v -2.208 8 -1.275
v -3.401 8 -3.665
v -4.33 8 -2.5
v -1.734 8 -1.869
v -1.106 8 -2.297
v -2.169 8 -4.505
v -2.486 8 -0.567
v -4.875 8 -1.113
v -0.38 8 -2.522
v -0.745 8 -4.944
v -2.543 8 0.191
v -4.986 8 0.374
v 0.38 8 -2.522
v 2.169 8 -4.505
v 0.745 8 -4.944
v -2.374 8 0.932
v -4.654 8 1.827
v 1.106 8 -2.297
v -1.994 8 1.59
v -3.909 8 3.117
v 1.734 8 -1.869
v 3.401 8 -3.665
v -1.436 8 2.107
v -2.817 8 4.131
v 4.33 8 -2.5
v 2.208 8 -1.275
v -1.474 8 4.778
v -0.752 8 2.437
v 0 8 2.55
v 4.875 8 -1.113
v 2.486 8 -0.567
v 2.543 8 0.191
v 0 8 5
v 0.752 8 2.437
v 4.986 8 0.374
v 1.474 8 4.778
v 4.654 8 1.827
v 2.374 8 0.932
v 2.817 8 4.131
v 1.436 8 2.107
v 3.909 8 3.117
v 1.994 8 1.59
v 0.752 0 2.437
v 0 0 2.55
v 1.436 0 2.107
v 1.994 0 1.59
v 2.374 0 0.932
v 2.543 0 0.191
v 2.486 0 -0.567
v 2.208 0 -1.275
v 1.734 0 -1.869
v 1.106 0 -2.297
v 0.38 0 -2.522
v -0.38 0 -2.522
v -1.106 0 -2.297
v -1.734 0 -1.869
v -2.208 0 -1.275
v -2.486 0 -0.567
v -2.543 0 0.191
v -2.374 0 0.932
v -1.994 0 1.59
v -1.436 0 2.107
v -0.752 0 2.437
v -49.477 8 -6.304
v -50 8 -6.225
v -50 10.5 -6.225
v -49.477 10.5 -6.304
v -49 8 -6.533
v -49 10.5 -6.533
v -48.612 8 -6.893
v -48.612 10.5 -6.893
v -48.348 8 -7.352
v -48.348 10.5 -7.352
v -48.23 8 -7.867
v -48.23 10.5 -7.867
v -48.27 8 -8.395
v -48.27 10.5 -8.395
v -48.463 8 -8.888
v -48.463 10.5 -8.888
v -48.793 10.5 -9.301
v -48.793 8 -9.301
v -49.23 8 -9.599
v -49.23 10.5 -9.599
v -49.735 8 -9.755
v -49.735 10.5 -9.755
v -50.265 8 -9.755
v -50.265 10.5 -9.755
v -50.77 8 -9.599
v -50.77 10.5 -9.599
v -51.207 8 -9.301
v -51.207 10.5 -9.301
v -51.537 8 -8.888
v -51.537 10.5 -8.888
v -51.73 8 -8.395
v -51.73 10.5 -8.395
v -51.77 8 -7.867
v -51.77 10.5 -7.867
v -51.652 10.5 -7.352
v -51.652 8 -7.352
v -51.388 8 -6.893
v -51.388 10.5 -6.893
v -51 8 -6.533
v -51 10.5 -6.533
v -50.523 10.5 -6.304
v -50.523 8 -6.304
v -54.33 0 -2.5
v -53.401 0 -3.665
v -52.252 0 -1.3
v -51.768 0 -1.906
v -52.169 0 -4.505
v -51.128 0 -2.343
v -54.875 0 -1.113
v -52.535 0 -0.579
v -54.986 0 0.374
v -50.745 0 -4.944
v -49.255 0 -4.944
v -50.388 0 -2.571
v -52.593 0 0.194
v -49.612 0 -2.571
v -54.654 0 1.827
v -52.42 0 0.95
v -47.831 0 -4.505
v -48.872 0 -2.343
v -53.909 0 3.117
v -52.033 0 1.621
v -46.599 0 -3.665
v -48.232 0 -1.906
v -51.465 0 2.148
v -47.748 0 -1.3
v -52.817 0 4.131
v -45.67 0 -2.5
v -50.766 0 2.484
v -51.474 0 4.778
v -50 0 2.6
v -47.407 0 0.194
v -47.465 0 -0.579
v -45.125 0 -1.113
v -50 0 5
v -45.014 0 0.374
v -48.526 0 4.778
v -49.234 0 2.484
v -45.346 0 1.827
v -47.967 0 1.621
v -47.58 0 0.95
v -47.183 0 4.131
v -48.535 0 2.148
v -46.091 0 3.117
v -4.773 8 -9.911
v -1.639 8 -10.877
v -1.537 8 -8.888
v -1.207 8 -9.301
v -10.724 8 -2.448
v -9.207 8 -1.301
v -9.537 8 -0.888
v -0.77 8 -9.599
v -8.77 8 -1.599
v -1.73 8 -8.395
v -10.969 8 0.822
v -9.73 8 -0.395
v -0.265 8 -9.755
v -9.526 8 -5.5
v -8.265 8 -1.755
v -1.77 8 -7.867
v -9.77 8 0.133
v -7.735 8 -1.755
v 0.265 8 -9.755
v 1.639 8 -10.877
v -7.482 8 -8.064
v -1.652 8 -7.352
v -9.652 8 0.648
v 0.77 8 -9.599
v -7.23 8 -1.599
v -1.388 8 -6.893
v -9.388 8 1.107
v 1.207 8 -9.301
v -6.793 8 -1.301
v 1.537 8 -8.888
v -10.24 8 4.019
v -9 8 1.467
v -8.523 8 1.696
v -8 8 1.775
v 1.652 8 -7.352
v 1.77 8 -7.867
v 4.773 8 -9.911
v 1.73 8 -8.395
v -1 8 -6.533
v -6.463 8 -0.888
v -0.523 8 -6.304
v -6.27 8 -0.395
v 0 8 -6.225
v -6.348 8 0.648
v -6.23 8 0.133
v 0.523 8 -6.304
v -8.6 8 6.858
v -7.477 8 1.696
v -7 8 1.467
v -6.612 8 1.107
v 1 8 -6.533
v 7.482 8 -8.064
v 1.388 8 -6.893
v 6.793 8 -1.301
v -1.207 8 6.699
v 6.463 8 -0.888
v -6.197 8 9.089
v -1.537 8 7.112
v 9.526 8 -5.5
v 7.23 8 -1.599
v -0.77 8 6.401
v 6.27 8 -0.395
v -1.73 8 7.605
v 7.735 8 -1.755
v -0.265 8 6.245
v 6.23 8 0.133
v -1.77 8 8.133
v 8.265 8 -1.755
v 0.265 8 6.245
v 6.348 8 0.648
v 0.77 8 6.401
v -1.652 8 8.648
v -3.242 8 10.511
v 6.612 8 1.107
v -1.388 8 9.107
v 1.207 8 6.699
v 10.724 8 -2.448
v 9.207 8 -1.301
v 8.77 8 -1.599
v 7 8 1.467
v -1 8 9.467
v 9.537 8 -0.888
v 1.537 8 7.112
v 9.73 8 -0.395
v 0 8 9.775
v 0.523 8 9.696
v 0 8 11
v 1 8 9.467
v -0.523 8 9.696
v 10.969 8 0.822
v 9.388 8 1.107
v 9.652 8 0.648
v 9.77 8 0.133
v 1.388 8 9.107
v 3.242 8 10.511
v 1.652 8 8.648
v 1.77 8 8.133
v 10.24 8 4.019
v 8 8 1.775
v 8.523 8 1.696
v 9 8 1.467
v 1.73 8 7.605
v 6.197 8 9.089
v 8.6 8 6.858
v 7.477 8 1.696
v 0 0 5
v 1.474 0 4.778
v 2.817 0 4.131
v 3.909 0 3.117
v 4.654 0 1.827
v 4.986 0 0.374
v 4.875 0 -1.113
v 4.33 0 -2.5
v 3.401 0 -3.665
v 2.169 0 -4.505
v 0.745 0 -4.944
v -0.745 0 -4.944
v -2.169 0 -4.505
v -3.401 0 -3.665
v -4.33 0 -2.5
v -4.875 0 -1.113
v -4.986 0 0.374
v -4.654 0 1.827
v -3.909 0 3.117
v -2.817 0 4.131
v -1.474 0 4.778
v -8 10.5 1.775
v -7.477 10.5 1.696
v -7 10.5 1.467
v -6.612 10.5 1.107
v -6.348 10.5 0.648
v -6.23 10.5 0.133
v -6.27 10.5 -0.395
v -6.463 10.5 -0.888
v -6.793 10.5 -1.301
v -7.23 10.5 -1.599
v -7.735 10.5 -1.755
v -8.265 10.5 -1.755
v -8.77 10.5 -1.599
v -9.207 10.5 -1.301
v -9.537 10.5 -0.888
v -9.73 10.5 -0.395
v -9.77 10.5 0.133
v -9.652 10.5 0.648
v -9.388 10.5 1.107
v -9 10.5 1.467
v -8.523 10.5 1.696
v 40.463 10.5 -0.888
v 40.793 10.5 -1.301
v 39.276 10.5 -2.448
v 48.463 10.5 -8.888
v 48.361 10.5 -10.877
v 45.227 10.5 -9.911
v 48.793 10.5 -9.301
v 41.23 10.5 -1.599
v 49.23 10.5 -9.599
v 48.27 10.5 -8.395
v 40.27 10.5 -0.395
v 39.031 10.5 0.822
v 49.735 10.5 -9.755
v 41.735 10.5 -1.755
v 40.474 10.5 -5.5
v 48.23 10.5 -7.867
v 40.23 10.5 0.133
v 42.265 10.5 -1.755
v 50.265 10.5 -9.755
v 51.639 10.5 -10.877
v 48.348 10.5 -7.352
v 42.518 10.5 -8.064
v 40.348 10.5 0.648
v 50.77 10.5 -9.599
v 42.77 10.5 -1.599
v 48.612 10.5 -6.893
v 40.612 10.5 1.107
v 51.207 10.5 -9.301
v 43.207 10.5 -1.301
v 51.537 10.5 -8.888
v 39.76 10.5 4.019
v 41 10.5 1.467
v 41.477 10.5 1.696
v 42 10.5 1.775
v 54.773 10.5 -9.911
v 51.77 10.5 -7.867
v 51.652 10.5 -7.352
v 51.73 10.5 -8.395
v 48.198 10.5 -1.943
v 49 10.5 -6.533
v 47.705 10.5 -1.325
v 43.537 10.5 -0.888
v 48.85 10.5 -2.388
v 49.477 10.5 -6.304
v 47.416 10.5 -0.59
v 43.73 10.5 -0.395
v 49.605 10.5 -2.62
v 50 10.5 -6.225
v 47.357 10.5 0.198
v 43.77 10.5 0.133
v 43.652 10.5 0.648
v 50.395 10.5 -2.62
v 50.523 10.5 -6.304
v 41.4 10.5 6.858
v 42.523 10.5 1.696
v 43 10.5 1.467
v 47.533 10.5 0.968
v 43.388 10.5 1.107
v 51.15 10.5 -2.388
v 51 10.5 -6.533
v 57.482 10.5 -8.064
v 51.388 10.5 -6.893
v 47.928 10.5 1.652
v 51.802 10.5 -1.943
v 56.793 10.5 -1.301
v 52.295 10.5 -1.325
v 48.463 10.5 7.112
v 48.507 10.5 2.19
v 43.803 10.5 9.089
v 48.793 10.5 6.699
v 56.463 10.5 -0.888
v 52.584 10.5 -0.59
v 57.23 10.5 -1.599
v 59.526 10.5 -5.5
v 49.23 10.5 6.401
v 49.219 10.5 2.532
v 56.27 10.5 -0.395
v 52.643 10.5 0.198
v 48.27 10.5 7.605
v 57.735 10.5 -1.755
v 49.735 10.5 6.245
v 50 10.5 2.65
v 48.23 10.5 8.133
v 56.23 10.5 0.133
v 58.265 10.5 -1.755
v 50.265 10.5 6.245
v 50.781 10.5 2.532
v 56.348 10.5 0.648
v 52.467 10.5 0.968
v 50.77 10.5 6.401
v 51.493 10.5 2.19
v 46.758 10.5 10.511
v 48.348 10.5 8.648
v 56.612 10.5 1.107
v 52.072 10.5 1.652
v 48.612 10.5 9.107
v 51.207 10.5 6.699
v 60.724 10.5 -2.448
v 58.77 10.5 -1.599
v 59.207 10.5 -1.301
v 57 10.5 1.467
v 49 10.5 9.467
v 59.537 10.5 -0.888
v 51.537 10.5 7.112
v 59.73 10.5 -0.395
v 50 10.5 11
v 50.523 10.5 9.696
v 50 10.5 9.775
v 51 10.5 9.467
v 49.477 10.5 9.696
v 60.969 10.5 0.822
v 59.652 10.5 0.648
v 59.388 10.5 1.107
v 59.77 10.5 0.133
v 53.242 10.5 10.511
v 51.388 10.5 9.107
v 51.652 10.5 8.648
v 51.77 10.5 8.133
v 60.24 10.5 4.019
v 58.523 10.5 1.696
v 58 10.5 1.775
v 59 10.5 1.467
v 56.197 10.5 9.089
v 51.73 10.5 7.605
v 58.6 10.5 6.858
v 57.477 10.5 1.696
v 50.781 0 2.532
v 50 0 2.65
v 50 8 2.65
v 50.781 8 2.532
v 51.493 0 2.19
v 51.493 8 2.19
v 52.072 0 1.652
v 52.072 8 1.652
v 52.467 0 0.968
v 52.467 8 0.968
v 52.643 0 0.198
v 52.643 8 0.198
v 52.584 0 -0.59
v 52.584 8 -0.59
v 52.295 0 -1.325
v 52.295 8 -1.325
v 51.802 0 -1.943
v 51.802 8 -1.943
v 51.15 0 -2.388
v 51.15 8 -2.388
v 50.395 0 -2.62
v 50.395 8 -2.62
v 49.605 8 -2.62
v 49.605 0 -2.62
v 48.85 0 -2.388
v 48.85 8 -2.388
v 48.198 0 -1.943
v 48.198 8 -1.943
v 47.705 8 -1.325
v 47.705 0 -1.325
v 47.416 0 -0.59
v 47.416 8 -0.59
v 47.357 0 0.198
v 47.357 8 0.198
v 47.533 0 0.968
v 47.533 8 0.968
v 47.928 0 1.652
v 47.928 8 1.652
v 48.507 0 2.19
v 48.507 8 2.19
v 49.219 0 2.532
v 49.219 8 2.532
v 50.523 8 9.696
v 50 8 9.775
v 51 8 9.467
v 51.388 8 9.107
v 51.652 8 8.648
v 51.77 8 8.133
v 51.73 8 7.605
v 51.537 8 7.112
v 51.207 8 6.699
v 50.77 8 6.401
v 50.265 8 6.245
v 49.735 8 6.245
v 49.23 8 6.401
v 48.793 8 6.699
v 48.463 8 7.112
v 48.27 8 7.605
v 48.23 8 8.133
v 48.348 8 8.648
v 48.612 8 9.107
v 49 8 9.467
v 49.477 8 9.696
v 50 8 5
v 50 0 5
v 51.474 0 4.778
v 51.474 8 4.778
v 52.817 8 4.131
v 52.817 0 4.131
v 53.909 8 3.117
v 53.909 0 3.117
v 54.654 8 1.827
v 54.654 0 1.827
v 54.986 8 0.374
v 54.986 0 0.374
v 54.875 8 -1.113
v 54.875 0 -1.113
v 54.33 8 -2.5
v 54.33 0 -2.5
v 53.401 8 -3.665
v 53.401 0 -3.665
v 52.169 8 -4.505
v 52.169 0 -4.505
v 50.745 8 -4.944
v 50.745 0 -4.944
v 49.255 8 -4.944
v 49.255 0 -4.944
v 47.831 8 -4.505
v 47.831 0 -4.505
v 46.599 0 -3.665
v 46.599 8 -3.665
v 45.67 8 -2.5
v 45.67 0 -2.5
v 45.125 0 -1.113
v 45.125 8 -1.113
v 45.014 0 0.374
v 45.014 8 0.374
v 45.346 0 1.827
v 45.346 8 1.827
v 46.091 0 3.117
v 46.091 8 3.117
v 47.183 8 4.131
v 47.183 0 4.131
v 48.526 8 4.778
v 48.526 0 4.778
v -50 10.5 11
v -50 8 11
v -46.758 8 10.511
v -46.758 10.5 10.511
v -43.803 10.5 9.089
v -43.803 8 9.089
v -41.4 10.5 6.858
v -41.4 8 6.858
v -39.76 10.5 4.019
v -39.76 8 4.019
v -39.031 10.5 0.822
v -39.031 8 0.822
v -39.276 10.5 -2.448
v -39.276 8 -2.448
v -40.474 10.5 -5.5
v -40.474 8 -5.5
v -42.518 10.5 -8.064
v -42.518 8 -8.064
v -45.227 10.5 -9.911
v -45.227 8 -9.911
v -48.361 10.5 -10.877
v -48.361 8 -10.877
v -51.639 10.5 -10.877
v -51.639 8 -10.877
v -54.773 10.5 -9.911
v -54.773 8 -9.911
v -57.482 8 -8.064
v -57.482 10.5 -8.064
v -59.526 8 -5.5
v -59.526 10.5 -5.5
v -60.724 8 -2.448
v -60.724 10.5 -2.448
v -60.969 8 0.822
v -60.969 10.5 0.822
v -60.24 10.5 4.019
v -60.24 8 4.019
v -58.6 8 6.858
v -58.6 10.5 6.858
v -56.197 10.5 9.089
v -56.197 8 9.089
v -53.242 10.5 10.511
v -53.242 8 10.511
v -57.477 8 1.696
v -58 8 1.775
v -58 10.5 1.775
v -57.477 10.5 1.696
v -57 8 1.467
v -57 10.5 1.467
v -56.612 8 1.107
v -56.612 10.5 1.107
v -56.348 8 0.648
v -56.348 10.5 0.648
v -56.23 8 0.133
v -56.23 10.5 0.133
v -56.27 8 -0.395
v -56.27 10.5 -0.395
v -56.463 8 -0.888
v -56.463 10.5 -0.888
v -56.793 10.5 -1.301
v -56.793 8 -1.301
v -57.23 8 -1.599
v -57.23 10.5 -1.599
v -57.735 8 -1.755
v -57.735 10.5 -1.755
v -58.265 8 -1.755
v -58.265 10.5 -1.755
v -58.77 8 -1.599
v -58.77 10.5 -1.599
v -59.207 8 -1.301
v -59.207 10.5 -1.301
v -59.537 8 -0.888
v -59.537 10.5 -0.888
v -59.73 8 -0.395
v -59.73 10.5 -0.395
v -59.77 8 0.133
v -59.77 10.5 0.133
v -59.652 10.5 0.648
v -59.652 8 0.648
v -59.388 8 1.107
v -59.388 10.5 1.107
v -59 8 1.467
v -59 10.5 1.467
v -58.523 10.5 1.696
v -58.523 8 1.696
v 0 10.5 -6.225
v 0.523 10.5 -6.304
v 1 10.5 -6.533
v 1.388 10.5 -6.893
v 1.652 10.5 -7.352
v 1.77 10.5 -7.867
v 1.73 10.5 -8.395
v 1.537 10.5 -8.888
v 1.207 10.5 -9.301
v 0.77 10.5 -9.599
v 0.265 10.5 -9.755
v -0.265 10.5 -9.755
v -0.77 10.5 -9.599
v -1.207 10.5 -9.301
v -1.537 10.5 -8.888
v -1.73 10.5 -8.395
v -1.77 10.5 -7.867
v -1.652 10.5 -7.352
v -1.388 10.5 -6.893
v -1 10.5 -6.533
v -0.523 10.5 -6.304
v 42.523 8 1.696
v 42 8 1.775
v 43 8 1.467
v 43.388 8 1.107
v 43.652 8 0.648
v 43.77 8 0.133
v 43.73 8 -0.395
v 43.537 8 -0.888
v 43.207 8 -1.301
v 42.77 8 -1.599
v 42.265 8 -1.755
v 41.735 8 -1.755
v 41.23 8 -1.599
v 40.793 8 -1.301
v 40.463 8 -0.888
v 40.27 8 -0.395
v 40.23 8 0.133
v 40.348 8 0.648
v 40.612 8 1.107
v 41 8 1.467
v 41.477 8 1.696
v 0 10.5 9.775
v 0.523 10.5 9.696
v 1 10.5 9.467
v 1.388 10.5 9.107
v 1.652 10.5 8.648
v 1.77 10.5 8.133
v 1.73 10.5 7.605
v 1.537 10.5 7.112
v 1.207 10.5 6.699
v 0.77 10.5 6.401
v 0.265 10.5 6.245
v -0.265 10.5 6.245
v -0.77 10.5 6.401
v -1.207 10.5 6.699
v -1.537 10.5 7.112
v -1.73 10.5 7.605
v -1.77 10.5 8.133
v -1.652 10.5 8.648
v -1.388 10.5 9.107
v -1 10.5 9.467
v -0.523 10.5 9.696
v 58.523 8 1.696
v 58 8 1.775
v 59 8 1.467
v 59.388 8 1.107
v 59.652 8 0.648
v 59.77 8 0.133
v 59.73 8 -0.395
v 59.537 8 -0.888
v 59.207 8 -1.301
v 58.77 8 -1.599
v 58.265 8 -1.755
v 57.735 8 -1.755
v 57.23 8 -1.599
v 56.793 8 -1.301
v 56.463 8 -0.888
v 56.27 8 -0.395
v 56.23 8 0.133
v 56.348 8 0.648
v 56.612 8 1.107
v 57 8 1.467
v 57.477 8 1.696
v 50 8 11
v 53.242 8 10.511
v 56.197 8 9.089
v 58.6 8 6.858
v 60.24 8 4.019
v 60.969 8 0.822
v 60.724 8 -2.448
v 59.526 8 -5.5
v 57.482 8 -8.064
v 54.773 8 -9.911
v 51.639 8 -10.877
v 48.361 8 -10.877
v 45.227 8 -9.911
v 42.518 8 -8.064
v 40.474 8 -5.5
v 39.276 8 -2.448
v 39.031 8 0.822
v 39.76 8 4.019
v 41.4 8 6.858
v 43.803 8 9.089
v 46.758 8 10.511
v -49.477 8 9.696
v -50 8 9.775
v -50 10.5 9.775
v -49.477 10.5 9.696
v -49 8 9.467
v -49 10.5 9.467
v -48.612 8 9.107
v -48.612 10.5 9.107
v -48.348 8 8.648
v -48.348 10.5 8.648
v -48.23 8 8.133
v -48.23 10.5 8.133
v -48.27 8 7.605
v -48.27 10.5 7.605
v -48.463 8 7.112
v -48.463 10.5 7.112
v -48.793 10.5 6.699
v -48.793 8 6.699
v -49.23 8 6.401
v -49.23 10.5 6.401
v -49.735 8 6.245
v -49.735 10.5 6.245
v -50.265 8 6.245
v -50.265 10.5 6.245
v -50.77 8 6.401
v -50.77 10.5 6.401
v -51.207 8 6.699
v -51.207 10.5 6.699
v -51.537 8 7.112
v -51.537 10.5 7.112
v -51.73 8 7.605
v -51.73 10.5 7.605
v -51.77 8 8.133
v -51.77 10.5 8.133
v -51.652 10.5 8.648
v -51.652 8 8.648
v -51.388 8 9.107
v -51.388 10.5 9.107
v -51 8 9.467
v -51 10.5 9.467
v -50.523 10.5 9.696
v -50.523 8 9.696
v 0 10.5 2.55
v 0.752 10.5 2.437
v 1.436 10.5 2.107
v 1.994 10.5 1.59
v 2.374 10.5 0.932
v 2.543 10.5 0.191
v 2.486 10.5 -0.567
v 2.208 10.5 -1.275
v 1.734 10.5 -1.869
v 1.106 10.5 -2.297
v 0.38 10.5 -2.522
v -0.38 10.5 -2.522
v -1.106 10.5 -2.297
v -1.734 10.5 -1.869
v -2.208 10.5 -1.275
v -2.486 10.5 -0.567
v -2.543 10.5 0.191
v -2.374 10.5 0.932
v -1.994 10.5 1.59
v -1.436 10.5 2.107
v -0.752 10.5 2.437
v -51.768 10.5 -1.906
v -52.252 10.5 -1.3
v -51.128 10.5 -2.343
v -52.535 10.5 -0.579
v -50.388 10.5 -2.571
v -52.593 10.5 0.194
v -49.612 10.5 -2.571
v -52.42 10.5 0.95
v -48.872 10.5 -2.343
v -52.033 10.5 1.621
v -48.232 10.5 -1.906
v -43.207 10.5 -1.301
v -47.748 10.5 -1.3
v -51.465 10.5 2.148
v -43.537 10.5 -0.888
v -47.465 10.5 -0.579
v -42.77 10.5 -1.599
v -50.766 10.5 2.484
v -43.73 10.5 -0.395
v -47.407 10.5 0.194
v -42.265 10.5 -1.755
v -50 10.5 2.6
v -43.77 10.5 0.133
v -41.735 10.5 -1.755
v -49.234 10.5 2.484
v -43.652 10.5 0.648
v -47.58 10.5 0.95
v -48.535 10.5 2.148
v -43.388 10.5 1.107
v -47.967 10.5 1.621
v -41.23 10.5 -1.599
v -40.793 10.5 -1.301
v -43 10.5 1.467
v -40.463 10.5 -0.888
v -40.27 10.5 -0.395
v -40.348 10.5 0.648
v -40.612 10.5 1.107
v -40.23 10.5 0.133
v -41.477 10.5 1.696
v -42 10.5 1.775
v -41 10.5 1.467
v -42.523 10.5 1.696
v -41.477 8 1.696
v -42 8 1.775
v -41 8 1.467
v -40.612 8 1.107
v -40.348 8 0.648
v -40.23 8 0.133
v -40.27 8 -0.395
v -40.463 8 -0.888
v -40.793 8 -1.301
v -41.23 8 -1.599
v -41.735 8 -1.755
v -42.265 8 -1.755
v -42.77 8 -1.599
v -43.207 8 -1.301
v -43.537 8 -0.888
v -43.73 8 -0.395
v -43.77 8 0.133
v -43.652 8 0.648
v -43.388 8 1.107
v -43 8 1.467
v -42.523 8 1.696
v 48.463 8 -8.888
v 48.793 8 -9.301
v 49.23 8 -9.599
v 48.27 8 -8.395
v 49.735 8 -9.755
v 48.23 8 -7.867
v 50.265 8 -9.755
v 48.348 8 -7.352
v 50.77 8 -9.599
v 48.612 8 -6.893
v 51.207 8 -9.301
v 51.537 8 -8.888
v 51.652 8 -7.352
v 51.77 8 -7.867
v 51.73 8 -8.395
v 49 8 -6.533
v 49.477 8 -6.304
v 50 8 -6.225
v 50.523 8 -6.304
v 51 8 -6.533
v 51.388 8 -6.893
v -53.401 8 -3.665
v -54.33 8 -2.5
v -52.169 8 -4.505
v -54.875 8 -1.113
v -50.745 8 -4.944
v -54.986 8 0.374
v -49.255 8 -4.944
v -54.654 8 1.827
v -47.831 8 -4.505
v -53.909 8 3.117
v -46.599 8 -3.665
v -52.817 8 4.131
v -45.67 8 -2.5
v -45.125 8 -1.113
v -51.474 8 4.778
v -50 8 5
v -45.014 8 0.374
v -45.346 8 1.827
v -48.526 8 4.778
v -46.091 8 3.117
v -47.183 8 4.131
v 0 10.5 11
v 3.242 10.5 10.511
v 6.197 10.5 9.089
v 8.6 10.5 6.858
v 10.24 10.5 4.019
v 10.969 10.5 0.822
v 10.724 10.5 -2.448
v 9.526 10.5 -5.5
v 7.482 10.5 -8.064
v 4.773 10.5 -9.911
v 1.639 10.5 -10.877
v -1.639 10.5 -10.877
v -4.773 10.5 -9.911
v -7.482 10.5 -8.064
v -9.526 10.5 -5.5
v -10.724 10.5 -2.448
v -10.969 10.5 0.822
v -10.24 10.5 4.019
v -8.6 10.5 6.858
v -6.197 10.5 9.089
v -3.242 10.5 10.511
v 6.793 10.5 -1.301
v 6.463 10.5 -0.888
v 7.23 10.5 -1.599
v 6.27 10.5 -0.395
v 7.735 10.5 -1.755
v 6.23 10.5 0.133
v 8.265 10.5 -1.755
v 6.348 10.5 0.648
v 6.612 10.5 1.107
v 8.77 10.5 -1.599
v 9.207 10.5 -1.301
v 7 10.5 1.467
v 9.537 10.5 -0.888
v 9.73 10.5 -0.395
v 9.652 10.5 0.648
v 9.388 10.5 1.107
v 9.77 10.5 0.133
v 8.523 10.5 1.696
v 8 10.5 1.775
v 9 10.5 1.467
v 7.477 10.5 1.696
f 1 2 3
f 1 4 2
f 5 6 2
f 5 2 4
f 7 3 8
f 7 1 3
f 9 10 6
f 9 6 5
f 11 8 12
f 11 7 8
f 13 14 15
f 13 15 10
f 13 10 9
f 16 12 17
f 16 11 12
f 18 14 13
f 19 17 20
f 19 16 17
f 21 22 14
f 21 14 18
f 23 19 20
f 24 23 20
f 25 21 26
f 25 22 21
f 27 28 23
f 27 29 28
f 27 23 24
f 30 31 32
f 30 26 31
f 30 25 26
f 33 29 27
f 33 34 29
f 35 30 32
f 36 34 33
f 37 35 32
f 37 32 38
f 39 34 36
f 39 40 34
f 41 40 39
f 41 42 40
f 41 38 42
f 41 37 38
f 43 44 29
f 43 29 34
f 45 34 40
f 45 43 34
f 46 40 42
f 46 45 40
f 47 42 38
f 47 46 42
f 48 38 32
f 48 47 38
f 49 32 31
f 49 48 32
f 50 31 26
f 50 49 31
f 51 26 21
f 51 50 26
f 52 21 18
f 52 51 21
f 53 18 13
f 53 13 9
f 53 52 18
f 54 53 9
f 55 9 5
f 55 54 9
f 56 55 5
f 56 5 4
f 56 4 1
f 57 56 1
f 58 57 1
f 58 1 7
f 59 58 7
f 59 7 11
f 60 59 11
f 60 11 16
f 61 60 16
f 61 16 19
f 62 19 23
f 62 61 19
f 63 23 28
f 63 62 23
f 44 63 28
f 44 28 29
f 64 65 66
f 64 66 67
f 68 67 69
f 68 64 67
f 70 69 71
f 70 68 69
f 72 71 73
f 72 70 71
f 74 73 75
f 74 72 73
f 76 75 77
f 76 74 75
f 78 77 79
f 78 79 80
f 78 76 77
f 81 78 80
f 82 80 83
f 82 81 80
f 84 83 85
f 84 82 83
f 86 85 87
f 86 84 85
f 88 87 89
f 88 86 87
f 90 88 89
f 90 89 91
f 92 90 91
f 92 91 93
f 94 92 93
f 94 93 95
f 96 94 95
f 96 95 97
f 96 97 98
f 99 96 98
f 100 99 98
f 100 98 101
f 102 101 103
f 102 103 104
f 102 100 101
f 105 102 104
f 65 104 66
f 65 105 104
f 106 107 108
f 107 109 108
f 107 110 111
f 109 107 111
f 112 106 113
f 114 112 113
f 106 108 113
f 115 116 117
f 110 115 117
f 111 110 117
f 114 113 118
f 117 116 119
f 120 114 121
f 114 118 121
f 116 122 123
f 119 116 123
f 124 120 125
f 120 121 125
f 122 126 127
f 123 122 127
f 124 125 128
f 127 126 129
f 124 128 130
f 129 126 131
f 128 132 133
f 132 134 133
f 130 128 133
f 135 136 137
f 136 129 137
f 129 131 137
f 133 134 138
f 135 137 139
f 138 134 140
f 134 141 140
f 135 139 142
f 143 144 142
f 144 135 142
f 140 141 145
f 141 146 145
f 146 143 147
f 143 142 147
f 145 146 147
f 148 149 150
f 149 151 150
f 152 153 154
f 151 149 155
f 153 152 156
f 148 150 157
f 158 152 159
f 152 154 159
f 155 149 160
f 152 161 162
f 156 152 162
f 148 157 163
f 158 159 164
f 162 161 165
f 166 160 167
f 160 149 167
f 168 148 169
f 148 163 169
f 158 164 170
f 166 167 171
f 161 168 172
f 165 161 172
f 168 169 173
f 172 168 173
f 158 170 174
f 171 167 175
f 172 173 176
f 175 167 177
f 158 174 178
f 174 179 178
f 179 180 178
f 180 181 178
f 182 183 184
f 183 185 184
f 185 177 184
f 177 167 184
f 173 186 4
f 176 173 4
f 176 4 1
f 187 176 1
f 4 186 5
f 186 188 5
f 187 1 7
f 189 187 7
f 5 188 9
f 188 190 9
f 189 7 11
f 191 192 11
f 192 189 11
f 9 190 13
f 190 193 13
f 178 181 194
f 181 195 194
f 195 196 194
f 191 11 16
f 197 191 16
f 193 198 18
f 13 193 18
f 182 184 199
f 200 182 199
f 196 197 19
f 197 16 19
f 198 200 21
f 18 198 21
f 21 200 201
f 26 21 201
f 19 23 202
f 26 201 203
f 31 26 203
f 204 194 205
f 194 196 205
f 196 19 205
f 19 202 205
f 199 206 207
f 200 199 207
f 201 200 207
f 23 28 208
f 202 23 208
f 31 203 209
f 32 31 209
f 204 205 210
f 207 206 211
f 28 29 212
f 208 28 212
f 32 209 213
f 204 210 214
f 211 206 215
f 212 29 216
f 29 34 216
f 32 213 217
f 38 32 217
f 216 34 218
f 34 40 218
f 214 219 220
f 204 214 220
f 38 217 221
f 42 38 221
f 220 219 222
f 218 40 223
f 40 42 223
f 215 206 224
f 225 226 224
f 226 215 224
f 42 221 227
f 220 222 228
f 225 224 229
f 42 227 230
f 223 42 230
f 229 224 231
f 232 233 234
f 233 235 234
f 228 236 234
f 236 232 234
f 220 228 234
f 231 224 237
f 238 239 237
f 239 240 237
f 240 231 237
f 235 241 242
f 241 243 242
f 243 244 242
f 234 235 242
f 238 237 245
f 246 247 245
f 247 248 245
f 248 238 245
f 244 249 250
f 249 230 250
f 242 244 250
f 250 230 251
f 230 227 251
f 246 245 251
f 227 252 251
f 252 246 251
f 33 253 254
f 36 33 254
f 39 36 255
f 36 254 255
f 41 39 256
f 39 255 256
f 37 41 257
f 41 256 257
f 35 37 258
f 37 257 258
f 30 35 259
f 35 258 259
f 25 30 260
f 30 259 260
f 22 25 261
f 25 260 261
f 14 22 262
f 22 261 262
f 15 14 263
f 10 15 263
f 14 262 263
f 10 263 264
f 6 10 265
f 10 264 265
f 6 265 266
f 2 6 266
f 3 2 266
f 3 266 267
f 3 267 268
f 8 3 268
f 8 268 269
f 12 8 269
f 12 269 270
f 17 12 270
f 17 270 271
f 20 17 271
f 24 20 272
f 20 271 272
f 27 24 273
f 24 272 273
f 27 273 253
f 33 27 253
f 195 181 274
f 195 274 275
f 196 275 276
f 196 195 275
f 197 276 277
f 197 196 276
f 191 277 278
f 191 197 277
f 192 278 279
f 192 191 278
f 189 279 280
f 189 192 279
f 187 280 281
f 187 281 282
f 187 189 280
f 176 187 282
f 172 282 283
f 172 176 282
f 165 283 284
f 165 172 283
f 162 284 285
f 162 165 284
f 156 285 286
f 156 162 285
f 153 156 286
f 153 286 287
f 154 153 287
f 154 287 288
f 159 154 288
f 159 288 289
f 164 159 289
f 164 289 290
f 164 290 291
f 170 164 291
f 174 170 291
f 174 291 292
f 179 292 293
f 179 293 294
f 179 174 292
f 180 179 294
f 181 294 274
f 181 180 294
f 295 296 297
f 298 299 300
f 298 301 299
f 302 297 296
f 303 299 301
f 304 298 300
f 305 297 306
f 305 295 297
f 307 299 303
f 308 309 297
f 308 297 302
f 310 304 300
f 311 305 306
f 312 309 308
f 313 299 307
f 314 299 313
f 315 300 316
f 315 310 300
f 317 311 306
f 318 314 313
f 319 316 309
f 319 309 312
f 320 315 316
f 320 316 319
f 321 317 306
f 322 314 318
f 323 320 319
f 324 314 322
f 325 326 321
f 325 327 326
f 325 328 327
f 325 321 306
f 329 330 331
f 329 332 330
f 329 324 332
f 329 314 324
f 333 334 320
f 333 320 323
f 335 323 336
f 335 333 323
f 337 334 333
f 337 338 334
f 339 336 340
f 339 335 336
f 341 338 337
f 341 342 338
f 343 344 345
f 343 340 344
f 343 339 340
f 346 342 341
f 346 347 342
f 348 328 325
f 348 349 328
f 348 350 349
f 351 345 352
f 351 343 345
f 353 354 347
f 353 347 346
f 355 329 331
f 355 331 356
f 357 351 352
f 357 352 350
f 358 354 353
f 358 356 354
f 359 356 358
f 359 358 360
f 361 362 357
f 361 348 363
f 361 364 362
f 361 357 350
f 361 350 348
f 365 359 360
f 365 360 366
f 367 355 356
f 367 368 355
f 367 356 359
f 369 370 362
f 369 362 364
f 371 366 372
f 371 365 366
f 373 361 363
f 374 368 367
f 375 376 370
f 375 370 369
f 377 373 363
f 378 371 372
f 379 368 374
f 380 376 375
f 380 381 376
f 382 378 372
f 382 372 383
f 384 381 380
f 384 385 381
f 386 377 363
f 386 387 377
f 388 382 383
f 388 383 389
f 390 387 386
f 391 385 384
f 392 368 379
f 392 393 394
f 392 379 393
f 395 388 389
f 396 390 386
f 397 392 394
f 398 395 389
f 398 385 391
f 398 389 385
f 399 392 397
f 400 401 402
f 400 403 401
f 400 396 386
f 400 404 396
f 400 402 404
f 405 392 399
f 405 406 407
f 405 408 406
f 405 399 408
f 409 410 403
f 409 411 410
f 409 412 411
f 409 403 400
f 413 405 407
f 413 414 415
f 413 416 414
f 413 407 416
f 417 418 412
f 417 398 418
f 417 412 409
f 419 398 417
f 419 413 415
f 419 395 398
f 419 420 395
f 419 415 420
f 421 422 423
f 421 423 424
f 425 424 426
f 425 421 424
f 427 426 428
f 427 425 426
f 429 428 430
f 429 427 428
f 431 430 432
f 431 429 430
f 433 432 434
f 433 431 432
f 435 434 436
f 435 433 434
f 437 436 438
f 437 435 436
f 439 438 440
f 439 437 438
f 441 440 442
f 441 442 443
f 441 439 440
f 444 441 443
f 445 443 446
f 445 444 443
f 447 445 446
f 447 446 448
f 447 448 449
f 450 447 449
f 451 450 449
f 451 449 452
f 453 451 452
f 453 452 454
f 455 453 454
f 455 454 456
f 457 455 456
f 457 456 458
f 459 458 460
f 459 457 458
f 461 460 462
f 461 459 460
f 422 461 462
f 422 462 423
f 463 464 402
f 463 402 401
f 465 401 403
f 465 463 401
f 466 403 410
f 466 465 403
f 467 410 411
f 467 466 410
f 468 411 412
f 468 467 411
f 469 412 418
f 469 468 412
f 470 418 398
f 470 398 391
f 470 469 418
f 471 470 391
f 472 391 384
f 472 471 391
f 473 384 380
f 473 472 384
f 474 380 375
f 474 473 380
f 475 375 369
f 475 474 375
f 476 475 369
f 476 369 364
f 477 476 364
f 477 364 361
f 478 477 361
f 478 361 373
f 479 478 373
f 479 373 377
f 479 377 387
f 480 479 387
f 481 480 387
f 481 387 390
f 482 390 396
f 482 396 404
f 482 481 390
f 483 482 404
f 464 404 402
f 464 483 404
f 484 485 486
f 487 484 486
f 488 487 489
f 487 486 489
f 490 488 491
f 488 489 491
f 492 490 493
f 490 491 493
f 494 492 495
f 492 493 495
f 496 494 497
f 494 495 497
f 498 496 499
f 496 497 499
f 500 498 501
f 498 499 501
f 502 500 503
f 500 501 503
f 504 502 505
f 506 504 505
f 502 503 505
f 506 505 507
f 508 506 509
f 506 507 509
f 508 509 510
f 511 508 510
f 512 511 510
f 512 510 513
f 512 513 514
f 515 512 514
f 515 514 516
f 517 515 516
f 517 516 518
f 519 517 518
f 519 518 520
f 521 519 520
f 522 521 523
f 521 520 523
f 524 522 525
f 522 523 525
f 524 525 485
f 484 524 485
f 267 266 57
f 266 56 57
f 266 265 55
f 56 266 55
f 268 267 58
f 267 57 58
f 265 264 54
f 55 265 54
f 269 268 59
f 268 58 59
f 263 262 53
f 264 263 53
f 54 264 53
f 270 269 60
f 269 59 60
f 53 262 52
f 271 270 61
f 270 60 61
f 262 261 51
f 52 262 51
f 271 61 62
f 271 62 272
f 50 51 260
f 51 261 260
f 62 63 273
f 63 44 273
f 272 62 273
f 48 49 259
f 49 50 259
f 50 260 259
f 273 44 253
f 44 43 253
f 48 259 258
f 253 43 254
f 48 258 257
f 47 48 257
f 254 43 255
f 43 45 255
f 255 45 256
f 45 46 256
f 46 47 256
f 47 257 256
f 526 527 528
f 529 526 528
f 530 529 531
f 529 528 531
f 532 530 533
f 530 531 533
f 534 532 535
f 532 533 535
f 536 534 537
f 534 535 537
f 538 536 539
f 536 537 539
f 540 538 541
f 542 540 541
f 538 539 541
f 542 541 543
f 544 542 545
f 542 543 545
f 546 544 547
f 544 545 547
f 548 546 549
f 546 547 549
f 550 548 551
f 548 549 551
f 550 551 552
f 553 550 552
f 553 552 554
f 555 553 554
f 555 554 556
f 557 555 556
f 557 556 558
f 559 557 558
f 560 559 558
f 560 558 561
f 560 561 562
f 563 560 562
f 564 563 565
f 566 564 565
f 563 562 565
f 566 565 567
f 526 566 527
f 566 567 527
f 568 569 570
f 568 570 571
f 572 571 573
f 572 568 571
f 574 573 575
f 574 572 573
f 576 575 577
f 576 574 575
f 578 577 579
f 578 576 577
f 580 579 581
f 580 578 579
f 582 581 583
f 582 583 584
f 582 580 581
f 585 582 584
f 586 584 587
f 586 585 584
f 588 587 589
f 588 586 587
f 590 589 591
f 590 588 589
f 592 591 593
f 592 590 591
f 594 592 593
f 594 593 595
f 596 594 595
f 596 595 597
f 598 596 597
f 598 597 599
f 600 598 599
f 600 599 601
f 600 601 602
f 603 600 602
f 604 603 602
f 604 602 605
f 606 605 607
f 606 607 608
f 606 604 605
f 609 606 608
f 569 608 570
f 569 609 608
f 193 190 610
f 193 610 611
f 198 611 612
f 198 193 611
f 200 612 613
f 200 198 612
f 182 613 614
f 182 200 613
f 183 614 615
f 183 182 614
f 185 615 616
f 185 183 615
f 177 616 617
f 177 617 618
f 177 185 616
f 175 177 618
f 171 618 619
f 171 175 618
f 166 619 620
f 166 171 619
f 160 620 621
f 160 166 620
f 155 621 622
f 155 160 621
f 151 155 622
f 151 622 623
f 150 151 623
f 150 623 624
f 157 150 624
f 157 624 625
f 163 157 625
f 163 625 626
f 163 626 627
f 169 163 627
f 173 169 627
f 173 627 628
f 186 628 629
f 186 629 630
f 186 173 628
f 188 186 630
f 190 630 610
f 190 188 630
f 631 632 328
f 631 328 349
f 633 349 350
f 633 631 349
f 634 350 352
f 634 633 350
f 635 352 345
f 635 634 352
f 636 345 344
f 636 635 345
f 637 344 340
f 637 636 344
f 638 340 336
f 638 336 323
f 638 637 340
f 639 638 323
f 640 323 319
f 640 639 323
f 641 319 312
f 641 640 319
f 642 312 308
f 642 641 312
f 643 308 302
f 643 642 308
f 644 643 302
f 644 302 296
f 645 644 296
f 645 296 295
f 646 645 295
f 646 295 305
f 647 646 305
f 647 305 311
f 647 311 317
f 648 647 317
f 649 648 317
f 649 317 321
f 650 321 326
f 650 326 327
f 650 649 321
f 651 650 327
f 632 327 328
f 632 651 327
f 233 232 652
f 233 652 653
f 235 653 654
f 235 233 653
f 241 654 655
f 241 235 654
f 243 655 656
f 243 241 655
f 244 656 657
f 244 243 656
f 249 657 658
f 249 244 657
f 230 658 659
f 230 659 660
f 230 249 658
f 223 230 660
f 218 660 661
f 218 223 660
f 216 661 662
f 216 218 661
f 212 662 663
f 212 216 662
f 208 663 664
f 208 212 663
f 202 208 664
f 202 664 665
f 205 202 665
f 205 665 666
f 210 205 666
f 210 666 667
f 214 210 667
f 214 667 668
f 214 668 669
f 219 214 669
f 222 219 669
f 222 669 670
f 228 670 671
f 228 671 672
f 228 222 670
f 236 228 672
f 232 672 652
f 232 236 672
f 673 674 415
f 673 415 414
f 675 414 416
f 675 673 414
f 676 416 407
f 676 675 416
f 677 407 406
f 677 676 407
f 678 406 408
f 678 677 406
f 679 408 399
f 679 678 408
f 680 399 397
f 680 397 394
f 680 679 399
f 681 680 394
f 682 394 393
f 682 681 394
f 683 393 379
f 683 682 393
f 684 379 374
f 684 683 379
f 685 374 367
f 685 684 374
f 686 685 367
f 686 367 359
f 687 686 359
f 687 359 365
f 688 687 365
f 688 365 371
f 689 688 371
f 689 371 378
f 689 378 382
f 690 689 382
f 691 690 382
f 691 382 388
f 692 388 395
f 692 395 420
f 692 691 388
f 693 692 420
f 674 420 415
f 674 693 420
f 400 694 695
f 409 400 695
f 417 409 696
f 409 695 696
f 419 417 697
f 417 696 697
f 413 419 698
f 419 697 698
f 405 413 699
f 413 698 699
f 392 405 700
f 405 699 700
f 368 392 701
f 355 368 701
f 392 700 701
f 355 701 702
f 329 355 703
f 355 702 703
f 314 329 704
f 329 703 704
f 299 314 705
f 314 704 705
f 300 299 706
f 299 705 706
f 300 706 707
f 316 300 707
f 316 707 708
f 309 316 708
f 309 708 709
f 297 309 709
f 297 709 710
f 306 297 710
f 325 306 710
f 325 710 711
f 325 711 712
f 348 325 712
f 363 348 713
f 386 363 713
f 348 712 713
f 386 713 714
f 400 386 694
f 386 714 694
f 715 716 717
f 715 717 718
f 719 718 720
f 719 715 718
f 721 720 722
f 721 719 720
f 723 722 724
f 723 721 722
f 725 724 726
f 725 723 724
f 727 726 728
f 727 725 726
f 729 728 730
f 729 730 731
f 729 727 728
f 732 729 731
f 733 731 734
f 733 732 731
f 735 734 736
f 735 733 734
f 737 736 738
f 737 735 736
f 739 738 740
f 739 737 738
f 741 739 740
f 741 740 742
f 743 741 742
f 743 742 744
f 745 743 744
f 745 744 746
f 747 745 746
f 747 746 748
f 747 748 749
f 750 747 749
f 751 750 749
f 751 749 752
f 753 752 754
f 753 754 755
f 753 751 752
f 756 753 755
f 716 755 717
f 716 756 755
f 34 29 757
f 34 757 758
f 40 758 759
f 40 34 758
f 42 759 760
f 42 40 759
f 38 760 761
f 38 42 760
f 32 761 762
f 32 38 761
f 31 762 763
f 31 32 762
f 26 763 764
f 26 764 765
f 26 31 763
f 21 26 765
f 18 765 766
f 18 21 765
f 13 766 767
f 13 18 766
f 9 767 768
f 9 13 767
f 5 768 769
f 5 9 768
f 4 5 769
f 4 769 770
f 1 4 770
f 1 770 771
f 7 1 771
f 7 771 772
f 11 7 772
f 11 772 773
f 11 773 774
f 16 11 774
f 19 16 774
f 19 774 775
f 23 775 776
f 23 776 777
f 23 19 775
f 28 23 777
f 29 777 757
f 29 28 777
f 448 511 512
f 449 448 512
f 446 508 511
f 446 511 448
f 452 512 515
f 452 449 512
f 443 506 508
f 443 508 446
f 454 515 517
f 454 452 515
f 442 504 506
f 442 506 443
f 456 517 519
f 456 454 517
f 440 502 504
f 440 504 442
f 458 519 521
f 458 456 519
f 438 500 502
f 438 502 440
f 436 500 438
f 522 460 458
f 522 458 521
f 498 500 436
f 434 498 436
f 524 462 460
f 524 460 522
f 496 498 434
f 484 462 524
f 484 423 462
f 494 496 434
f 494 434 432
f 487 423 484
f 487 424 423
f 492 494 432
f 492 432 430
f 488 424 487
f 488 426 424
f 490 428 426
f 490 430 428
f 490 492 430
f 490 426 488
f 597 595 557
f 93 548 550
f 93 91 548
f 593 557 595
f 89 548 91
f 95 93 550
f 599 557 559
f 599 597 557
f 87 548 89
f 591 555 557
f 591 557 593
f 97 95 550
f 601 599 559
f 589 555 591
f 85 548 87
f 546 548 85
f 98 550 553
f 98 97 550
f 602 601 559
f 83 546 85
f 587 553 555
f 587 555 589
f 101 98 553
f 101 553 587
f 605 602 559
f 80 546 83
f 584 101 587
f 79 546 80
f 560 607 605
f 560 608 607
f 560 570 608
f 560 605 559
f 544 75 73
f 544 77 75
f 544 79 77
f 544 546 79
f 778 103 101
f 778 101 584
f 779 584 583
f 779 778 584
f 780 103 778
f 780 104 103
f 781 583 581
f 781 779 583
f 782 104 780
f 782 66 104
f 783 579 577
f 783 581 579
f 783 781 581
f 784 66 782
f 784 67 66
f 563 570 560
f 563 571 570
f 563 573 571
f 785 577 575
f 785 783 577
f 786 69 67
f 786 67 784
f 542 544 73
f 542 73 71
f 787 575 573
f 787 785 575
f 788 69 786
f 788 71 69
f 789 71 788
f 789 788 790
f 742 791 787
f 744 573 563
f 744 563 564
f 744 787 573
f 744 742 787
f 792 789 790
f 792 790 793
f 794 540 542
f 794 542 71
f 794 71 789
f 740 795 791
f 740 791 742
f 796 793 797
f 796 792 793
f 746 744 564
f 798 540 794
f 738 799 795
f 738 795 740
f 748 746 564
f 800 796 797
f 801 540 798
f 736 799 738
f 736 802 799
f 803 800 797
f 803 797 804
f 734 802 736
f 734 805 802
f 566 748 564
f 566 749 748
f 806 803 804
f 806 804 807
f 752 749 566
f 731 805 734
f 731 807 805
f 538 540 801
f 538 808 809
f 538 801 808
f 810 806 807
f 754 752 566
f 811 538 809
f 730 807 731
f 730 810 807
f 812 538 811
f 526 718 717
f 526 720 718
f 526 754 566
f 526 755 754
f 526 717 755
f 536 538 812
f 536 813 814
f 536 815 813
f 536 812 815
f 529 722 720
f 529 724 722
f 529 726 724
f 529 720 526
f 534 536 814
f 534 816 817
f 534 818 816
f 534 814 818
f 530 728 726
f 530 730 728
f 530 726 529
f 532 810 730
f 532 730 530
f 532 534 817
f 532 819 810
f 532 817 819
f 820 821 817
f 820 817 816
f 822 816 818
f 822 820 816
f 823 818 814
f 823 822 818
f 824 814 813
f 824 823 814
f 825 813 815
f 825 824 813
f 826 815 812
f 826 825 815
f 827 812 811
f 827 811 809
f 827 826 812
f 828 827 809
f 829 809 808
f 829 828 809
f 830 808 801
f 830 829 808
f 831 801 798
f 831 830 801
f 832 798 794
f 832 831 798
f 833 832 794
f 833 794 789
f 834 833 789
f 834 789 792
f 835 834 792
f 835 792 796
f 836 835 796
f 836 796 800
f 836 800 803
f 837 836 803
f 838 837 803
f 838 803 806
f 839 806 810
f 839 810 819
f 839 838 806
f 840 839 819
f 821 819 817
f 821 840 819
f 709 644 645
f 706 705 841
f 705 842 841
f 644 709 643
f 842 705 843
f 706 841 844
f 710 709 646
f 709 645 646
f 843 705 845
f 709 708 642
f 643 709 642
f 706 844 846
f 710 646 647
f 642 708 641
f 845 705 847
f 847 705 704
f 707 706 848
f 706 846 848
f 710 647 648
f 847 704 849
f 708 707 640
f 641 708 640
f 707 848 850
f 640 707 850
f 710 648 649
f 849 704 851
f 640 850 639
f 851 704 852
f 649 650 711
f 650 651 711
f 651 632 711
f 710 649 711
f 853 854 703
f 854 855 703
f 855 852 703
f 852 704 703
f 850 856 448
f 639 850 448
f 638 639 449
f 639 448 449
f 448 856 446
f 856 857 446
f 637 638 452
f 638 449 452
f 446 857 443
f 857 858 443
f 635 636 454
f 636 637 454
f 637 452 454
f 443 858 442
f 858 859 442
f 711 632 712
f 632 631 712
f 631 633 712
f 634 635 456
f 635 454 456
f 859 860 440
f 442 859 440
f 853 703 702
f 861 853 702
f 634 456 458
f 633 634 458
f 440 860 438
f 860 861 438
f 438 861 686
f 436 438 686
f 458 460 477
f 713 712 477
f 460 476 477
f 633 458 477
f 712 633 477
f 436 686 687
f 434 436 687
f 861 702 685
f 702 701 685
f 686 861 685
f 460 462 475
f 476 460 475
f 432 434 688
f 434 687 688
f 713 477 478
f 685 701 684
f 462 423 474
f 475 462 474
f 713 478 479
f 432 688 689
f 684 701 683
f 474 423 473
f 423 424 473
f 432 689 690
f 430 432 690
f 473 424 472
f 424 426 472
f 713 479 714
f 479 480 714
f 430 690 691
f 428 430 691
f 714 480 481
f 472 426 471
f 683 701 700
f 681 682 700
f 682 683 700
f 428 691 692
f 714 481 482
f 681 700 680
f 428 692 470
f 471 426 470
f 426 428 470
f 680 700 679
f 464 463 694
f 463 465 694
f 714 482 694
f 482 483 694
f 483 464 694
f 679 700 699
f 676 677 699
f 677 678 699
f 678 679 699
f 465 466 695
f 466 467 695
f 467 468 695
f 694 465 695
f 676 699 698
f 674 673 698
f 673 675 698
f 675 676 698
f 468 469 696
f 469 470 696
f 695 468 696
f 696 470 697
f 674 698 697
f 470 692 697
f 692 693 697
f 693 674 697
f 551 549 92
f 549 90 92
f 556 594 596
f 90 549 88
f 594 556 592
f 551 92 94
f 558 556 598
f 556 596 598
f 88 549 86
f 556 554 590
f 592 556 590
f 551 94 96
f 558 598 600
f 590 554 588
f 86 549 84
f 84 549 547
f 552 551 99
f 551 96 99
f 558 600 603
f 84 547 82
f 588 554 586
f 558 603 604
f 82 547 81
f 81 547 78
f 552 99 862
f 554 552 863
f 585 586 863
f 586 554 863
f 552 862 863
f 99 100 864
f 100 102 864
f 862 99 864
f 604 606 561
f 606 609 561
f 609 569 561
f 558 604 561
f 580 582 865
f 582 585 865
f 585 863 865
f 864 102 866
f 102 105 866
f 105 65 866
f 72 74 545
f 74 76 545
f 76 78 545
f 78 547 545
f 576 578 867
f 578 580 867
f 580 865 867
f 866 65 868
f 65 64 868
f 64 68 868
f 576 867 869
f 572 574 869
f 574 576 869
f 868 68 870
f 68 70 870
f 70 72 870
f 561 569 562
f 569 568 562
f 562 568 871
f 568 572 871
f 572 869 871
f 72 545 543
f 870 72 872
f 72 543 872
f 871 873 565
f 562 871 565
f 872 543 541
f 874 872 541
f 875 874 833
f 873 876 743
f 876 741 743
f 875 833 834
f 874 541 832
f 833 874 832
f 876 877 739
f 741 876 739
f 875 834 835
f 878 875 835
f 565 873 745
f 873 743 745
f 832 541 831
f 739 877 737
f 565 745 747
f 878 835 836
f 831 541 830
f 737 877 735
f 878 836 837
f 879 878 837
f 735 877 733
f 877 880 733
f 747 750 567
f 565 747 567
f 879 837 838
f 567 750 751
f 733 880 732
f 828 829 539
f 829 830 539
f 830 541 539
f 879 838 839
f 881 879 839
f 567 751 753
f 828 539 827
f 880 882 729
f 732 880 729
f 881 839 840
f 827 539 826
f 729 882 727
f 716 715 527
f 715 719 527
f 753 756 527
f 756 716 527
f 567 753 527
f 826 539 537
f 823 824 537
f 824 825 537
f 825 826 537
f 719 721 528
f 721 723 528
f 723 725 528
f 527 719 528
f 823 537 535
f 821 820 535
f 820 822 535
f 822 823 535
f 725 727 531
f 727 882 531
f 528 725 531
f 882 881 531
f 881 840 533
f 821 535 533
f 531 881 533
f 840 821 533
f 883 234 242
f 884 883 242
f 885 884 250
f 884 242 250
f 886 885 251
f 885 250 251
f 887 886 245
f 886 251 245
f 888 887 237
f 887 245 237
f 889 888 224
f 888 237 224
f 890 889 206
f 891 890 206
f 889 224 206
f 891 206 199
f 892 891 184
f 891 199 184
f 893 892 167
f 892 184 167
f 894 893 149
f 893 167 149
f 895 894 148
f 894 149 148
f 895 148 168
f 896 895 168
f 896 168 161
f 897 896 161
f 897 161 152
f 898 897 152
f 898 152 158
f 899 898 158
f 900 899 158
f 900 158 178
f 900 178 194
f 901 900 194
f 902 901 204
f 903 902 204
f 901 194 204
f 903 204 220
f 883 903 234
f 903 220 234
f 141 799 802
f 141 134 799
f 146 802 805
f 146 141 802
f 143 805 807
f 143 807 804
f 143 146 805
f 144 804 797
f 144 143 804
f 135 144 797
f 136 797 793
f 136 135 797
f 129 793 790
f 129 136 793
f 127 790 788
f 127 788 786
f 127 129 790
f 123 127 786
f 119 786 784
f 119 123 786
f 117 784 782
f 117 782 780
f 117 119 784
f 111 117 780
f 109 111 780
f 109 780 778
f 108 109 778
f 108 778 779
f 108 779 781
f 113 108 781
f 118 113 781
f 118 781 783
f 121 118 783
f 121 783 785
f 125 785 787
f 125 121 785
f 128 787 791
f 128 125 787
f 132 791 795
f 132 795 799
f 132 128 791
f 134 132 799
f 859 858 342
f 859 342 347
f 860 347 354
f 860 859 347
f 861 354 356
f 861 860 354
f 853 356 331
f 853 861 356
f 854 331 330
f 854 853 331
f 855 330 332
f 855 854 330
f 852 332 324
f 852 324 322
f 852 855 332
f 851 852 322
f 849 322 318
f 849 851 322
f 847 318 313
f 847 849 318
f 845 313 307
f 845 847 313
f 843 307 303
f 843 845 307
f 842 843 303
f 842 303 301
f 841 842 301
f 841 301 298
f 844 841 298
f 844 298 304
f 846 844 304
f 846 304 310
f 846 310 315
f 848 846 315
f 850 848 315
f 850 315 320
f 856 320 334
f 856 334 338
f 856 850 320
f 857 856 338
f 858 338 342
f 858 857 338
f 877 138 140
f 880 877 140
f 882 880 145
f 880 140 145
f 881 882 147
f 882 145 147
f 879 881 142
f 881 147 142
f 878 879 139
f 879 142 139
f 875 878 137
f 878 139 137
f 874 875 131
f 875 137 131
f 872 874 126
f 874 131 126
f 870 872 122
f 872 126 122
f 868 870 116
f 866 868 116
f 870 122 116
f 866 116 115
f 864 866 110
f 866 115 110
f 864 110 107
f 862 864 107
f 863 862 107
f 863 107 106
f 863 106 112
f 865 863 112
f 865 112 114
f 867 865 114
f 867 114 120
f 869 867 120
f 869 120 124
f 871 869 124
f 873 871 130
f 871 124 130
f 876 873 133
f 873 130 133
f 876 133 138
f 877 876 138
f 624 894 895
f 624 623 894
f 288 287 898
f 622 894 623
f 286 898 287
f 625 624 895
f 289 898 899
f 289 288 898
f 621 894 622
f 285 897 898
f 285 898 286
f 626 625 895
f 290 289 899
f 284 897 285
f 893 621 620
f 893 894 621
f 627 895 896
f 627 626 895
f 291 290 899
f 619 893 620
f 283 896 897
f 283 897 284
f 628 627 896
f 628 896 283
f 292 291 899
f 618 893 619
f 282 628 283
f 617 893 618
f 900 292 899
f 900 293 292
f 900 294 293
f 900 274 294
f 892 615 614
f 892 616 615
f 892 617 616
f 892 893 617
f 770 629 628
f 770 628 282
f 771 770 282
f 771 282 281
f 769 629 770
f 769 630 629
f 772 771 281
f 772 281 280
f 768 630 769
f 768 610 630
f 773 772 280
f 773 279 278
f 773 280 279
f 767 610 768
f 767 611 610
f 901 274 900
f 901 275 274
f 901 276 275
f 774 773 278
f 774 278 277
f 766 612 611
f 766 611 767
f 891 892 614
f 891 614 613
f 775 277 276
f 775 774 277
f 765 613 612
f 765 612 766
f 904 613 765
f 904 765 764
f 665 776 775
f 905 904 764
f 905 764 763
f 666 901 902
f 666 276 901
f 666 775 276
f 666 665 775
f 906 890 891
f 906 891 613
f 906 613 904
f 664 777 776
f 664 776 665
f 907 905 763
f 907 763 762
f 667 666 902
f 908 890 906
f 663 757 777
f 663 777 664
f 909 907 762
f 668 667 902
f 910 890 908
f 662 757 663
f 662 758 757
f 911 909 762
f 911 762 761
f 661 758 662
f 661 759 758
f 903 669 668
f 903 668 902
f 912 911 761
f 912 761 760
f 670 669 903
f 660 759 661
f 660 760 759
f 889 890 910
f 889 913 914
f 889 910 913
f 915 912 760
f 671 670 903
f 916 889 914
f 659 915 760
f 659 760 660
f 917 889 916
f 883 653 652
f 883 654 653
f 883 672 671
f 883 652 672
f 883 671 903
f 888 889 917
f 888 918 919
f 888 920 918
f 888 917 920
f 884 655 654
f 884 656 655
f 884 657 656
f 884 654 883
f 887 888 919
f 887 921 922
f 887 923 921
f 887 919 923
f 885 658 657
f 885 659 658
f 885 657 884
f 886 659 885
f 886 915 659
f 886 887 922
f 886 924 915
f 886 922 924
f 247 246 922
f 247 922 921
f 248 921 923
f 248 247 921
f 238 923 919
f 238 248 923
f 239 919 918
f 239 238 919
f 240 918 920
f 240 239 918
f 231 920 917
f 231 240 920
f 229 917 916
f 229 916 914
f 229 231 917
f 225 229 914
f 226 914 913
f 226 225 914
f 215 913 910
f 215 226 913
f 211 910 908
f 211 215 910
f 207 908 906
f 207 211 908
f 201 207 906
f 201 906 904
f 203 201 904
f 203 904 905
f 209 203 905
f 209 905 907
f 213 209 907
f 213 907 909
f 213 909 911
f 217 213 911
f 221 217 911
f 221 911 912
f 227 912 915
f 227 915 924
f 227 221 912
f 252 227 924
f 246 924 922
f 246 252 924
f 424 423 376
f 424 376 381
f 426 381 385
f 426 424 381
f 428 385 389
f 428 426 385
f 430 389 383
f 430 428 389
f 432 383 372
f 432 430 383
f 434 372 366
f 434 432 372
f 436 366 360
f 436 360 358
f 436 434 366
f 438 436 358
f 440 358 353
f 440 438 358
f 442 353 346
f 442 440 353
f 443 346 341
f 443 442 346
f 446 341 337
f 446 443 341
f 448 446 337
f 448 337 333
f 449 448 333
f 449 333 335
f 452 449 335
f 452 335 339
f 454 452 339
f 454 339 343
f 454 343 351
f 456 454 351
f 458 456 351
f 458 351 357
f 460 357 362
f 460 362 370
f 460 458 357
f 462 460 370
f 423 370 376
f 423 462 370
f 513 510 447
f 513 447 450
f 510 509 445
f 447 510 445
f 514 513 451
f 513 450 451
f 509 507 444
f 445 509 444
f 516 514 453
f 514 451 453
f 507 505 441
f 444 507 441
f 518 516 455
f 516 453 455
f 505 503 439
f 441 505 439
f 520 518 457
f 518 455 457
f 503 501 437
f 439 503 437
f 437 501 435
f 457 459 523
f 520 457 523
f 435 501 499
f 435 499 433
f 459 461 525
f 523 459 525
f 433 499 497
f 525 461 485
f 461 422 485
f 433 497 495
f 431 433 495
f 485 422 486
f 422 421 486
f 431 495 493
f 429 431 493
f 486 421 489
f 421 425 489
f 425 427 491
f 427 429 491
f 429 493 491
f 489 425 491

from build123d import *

# Parameters (mm, degrees)
SKETCH_1_R        = 5
SKETCH_1_R_2      = 2.55
EXTRUDE_1_DEPTH   = 8
SKETCH_1_R_3      = 2.6
EXTRUDE_1_2_DEPTH = 8
SKETCH_1_R_4      = 2.65
EXTRUDE_1_3_DEPTH = 8
SKETCH_3_R        = 11
SKETCH_3_R_2      = 2.6
SKETCH_3_R_3      = 1.775
SKETCH_3_R_4      = 2.55
SKETCH_3_R_5      = 2.65
EXTRUDE_2_DEPTH   = 2.5


with BuildPart() as part:
    # 草图1 → 凸台-拉伸1 (new body)
    with BuildSketch(Plane(origin=(0, 0, 0), x_dir=(1, 0, 0), z_dir=(0, 1, 0))):
        with Locations(Location((0, 0, 0), (0, 0, 270))):
            Circle(SKETCH_1_R)
        with Locations(Location((0, 0, 0), (0, 0, 270))):
            Circle(SKETCH_1_R_2, mode=Mode.SUBTRACT)
    extrude(amount=EXTRUDE_1_DEPTH)


with BuildPart() as body_2:
    # 草图1 → Extrude 1 2 (new body)
    with BuildSketch(Plane(origin=(0, 0, 0), x_dir=(1, 0, 0), z_dir=(0, 1, 0))):
        with Locations(Location((-50, 0, 0), (0, 0, 270))):
            Circle(SKETCH_1_R)
        with Locations(Location((-50, 0, 0), (0, 0, 270))):
            Circle(SKETCH_1_R_3, mode=Mode.SUBTRACT)
    extrude(amount=EXTRUDE_1_2_DEPTH)

    # 草图3 → 凸台-拉伸2 (add)
    # profile 1 of 3: a face of its own
    with BuildSketch(Plane(origin=(0, 8, 0), x_dir=(1, 0, 0), z_dir=(0, 1, 0))):
        with Locations(Location((-50, 0, 0), (0, 0, 270))):
            Circle(SKETCH_3_R)
        with Locations(Location((-50, 0, 0), (0, 0, 270))):
            Circle(SKETCH_3_R_2, mode=Mode.SUBTRACT)
        with Locations(Location((-50, 8, 0), (0, 0, 270))):
            Circle(SKETCH_3_R_3, mode=Mode.SUBTRACT)
        with Locations(Location((-42, 0, 0), (0, 0, 270))):
            Circle(SKETCH_3_R_3, mode=Mode.SUBTRACT)
        with Locations(Location((-50, -8, 0), (0, 0, 270))):
            Circle(SKETCH_3_R_3, mode=Mode.SUBTRACT)
        with Locations(Location((-58, 0, 0), (0, 0, 270))):
            Circle(SKETCH_3_R_3, mode=Mode.SUBTRACT)
    # profile 2 of 3: a face of its own
    with BuildSketch(Plane(origin=(0, 8, 0), x_dir=(1, 0, 0), z_dir=(0, 1, 0))):
        with Locations(Location((0, 0, 0), (0, 0, 270))):
            Circle(SKETCH_3_R)
        with Locations(Location((0, 0, 0), (0, 0, 270))):
            Circle(SKETCH_3_R_4, mode=Mode.SUBTRACT)
        with Locations(Location((0, 8, 0), (0, 0, 270))):
            Circle(SKETCH_3_R_3, mode=Mode.SUBTRACT)
        with Locations(Location((8, 0, 0), (0, 0, 270))):
            Circle(SKETCH_3_R_3, mode=Mode.SUBTRACT)
        with Locations(Location((0, -8, 0), (0, 0, 270))):
            Circle(SKETCH_3_R_3, mode=Mode.SUBTRACT)
        with Locations(Location((-8, 0, 0), (0, 0, 270))):
            Circle(SKETCH_3_R_3, mode=Mode.SUBTRACT)
    # profile 3 of 3: a face of its own
    with BuildSketch(Plane(origin=(0, 8, 0), x_dir=(1, 0, 0), z_dir=(0, 1, 0))):
        with Locations(Location((50, 0, 0), (0, 0, 270))):
            Circle(SKETCH_3_R)
        with Locations(Location((50, 0, 0), (0, 0, 270))):
            Circle(SKETCH_3_R_5, mode=Mode.SUBTRACT)
        with Locations(Location((50, 8, 0), (0, 0, 270))):
            Circle(SKETCH_3_R_3, mode=Mode.SUBTRACT)
        with Locations(Location((58, 0, 0), (0, 0, 270))):
            Circle(SKETCH_3_R_3, mode=Mode.SUBTRACT)
        with Locations(Location((50, -8, 0), (0, 0, 270))):
            Circle(SKETCH_3_R_3, mode=Mode.SUBTRACT)
        with Locations(Location((42, 0, 0), (0, 0, 270))):
            Circle(SKETCH_3_R_3, mode=Mode.SUBTRACT)
    extrude(amount=EXTRUDE_2_DEPTH)


with BuildPart() as body_3:
    # 草图1 → Extrude 1 3 (new body)
    with BuildSketch(Plane(origin=(0, 0, 0), x_dir=(1, 0, 0), z_dir=(0, 1, 0))):
        with Locations(Location((50, 0, 0), (0, 0, 270))):
            Circle(SKETCH_1_R)
        with Locations(Location((50, 0, 0), (0, 0, 270))):
            Circle(SKETCH_1_R_4, mode=Mode.SUBTRACT)
    extrude(amount=EXTRUDE_1_3_DEPTH)


with BuildPart() as extrude_2_piece_1:
    # of the separate pieces the step leaves, piece 1, a body of its own (extrude_2_pieces)
    add(body_2.part.solids().sort_by_distance((-50, 0, 5))[0])


with BuildPart() as extrude_2_piece_2:
    # of the separate pieces the step leaves, piece 2, a body of its own (extrude_2_pieces)
    add(body_2.part.solids().sort_by_distance((0, 8, 11))[0])


with BuildPart() as extrude_2_piece_3:
    # of the separate pieces the step leaves, piece 3, a body of its own (extrude_2_pieces)
    add(body_2.part.solids().sort_by_distance((50, 8, 11))[0])


solid = Compound([part.part, body_3.part, extrude_2_piece_1.part, extrude_2_piece_2.part, extrude_2_piece_3.part])
